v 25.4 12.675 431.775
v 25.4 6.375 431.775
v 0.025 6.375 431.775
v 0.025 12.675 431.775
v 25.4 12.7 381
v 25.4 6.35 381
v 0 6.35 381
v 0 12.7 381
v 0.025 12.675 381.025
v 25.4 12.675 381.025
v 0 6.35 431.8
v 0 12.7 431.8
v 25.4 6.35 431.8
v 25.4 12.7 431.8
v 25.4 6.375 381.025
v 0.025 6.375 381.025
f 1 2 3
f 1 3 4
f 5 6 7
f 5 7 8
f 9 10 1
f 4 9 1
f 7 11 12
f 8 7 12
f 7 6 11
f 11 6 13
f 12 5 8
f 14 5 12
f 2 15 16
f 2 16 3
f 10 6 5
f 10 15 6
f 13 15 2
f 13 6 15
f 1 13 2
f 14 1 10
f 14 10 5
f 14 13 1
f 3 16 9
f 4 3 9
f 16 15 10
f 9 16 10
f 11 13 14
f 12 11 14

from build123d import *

# Parameters (mm, degrees)
F0_W     = 609.6
F0_H     = 381
F1_DEPTH = 19.05
F2_SIZE2 = 27.2352378905
F2_SIZE  = 12.7
F3_W     = 50.8
F3_H     = 889
F4_DEPTH = 25.4
F5_W     = 6.35
F5_H     = 50.8
F6_DEPTH = 25.4
F7_T     = -0.0254


with BuildPart() as f1:
    # F0 (on Top) → F1 (new body)
    with BuildSketch(Plane.XY):
        Rectangle(F0_W, F0_H)
    extrude(amount=F1_DEPTH)

    # F2
    f2_edges = [f1.edges().sort_by_distance(p)[0] for p in [
        (0, -190.5, 0),
        (304.8, 0, 0),
        (0, 190.5, 0),
        (-304.8, 0, 0),
    ]]
    chamfer(f2_edges, length=F2_SIZE, length2=F2_SIZE2)

    # F3 (on Right) → F4 (join, symmetric)
    with BuildSketch(Plane.YZ):
        Rectangle(F3_W, F3_H)
    extrude(amount=F4_DEPTH, both=True)

    # F5 (on face) → F6 (intersect)
    with BuildSketch(Plane.YZ.offset(25.4)):
        with Locations((9.525, 406.4)):
            Rectangle(F5_W, F5_H)
    extrude(amount=-F6_DEPTH, mode=Mode.INTERSECT)

    # F7
    f7_openings = [f1.faces().sort_by_distance(p)[0] for p in [
        (25.4, 9.525, 406.4),
    ]]
    offset(amount=F7_T, openings=f7_openings)


solid = f1.part
